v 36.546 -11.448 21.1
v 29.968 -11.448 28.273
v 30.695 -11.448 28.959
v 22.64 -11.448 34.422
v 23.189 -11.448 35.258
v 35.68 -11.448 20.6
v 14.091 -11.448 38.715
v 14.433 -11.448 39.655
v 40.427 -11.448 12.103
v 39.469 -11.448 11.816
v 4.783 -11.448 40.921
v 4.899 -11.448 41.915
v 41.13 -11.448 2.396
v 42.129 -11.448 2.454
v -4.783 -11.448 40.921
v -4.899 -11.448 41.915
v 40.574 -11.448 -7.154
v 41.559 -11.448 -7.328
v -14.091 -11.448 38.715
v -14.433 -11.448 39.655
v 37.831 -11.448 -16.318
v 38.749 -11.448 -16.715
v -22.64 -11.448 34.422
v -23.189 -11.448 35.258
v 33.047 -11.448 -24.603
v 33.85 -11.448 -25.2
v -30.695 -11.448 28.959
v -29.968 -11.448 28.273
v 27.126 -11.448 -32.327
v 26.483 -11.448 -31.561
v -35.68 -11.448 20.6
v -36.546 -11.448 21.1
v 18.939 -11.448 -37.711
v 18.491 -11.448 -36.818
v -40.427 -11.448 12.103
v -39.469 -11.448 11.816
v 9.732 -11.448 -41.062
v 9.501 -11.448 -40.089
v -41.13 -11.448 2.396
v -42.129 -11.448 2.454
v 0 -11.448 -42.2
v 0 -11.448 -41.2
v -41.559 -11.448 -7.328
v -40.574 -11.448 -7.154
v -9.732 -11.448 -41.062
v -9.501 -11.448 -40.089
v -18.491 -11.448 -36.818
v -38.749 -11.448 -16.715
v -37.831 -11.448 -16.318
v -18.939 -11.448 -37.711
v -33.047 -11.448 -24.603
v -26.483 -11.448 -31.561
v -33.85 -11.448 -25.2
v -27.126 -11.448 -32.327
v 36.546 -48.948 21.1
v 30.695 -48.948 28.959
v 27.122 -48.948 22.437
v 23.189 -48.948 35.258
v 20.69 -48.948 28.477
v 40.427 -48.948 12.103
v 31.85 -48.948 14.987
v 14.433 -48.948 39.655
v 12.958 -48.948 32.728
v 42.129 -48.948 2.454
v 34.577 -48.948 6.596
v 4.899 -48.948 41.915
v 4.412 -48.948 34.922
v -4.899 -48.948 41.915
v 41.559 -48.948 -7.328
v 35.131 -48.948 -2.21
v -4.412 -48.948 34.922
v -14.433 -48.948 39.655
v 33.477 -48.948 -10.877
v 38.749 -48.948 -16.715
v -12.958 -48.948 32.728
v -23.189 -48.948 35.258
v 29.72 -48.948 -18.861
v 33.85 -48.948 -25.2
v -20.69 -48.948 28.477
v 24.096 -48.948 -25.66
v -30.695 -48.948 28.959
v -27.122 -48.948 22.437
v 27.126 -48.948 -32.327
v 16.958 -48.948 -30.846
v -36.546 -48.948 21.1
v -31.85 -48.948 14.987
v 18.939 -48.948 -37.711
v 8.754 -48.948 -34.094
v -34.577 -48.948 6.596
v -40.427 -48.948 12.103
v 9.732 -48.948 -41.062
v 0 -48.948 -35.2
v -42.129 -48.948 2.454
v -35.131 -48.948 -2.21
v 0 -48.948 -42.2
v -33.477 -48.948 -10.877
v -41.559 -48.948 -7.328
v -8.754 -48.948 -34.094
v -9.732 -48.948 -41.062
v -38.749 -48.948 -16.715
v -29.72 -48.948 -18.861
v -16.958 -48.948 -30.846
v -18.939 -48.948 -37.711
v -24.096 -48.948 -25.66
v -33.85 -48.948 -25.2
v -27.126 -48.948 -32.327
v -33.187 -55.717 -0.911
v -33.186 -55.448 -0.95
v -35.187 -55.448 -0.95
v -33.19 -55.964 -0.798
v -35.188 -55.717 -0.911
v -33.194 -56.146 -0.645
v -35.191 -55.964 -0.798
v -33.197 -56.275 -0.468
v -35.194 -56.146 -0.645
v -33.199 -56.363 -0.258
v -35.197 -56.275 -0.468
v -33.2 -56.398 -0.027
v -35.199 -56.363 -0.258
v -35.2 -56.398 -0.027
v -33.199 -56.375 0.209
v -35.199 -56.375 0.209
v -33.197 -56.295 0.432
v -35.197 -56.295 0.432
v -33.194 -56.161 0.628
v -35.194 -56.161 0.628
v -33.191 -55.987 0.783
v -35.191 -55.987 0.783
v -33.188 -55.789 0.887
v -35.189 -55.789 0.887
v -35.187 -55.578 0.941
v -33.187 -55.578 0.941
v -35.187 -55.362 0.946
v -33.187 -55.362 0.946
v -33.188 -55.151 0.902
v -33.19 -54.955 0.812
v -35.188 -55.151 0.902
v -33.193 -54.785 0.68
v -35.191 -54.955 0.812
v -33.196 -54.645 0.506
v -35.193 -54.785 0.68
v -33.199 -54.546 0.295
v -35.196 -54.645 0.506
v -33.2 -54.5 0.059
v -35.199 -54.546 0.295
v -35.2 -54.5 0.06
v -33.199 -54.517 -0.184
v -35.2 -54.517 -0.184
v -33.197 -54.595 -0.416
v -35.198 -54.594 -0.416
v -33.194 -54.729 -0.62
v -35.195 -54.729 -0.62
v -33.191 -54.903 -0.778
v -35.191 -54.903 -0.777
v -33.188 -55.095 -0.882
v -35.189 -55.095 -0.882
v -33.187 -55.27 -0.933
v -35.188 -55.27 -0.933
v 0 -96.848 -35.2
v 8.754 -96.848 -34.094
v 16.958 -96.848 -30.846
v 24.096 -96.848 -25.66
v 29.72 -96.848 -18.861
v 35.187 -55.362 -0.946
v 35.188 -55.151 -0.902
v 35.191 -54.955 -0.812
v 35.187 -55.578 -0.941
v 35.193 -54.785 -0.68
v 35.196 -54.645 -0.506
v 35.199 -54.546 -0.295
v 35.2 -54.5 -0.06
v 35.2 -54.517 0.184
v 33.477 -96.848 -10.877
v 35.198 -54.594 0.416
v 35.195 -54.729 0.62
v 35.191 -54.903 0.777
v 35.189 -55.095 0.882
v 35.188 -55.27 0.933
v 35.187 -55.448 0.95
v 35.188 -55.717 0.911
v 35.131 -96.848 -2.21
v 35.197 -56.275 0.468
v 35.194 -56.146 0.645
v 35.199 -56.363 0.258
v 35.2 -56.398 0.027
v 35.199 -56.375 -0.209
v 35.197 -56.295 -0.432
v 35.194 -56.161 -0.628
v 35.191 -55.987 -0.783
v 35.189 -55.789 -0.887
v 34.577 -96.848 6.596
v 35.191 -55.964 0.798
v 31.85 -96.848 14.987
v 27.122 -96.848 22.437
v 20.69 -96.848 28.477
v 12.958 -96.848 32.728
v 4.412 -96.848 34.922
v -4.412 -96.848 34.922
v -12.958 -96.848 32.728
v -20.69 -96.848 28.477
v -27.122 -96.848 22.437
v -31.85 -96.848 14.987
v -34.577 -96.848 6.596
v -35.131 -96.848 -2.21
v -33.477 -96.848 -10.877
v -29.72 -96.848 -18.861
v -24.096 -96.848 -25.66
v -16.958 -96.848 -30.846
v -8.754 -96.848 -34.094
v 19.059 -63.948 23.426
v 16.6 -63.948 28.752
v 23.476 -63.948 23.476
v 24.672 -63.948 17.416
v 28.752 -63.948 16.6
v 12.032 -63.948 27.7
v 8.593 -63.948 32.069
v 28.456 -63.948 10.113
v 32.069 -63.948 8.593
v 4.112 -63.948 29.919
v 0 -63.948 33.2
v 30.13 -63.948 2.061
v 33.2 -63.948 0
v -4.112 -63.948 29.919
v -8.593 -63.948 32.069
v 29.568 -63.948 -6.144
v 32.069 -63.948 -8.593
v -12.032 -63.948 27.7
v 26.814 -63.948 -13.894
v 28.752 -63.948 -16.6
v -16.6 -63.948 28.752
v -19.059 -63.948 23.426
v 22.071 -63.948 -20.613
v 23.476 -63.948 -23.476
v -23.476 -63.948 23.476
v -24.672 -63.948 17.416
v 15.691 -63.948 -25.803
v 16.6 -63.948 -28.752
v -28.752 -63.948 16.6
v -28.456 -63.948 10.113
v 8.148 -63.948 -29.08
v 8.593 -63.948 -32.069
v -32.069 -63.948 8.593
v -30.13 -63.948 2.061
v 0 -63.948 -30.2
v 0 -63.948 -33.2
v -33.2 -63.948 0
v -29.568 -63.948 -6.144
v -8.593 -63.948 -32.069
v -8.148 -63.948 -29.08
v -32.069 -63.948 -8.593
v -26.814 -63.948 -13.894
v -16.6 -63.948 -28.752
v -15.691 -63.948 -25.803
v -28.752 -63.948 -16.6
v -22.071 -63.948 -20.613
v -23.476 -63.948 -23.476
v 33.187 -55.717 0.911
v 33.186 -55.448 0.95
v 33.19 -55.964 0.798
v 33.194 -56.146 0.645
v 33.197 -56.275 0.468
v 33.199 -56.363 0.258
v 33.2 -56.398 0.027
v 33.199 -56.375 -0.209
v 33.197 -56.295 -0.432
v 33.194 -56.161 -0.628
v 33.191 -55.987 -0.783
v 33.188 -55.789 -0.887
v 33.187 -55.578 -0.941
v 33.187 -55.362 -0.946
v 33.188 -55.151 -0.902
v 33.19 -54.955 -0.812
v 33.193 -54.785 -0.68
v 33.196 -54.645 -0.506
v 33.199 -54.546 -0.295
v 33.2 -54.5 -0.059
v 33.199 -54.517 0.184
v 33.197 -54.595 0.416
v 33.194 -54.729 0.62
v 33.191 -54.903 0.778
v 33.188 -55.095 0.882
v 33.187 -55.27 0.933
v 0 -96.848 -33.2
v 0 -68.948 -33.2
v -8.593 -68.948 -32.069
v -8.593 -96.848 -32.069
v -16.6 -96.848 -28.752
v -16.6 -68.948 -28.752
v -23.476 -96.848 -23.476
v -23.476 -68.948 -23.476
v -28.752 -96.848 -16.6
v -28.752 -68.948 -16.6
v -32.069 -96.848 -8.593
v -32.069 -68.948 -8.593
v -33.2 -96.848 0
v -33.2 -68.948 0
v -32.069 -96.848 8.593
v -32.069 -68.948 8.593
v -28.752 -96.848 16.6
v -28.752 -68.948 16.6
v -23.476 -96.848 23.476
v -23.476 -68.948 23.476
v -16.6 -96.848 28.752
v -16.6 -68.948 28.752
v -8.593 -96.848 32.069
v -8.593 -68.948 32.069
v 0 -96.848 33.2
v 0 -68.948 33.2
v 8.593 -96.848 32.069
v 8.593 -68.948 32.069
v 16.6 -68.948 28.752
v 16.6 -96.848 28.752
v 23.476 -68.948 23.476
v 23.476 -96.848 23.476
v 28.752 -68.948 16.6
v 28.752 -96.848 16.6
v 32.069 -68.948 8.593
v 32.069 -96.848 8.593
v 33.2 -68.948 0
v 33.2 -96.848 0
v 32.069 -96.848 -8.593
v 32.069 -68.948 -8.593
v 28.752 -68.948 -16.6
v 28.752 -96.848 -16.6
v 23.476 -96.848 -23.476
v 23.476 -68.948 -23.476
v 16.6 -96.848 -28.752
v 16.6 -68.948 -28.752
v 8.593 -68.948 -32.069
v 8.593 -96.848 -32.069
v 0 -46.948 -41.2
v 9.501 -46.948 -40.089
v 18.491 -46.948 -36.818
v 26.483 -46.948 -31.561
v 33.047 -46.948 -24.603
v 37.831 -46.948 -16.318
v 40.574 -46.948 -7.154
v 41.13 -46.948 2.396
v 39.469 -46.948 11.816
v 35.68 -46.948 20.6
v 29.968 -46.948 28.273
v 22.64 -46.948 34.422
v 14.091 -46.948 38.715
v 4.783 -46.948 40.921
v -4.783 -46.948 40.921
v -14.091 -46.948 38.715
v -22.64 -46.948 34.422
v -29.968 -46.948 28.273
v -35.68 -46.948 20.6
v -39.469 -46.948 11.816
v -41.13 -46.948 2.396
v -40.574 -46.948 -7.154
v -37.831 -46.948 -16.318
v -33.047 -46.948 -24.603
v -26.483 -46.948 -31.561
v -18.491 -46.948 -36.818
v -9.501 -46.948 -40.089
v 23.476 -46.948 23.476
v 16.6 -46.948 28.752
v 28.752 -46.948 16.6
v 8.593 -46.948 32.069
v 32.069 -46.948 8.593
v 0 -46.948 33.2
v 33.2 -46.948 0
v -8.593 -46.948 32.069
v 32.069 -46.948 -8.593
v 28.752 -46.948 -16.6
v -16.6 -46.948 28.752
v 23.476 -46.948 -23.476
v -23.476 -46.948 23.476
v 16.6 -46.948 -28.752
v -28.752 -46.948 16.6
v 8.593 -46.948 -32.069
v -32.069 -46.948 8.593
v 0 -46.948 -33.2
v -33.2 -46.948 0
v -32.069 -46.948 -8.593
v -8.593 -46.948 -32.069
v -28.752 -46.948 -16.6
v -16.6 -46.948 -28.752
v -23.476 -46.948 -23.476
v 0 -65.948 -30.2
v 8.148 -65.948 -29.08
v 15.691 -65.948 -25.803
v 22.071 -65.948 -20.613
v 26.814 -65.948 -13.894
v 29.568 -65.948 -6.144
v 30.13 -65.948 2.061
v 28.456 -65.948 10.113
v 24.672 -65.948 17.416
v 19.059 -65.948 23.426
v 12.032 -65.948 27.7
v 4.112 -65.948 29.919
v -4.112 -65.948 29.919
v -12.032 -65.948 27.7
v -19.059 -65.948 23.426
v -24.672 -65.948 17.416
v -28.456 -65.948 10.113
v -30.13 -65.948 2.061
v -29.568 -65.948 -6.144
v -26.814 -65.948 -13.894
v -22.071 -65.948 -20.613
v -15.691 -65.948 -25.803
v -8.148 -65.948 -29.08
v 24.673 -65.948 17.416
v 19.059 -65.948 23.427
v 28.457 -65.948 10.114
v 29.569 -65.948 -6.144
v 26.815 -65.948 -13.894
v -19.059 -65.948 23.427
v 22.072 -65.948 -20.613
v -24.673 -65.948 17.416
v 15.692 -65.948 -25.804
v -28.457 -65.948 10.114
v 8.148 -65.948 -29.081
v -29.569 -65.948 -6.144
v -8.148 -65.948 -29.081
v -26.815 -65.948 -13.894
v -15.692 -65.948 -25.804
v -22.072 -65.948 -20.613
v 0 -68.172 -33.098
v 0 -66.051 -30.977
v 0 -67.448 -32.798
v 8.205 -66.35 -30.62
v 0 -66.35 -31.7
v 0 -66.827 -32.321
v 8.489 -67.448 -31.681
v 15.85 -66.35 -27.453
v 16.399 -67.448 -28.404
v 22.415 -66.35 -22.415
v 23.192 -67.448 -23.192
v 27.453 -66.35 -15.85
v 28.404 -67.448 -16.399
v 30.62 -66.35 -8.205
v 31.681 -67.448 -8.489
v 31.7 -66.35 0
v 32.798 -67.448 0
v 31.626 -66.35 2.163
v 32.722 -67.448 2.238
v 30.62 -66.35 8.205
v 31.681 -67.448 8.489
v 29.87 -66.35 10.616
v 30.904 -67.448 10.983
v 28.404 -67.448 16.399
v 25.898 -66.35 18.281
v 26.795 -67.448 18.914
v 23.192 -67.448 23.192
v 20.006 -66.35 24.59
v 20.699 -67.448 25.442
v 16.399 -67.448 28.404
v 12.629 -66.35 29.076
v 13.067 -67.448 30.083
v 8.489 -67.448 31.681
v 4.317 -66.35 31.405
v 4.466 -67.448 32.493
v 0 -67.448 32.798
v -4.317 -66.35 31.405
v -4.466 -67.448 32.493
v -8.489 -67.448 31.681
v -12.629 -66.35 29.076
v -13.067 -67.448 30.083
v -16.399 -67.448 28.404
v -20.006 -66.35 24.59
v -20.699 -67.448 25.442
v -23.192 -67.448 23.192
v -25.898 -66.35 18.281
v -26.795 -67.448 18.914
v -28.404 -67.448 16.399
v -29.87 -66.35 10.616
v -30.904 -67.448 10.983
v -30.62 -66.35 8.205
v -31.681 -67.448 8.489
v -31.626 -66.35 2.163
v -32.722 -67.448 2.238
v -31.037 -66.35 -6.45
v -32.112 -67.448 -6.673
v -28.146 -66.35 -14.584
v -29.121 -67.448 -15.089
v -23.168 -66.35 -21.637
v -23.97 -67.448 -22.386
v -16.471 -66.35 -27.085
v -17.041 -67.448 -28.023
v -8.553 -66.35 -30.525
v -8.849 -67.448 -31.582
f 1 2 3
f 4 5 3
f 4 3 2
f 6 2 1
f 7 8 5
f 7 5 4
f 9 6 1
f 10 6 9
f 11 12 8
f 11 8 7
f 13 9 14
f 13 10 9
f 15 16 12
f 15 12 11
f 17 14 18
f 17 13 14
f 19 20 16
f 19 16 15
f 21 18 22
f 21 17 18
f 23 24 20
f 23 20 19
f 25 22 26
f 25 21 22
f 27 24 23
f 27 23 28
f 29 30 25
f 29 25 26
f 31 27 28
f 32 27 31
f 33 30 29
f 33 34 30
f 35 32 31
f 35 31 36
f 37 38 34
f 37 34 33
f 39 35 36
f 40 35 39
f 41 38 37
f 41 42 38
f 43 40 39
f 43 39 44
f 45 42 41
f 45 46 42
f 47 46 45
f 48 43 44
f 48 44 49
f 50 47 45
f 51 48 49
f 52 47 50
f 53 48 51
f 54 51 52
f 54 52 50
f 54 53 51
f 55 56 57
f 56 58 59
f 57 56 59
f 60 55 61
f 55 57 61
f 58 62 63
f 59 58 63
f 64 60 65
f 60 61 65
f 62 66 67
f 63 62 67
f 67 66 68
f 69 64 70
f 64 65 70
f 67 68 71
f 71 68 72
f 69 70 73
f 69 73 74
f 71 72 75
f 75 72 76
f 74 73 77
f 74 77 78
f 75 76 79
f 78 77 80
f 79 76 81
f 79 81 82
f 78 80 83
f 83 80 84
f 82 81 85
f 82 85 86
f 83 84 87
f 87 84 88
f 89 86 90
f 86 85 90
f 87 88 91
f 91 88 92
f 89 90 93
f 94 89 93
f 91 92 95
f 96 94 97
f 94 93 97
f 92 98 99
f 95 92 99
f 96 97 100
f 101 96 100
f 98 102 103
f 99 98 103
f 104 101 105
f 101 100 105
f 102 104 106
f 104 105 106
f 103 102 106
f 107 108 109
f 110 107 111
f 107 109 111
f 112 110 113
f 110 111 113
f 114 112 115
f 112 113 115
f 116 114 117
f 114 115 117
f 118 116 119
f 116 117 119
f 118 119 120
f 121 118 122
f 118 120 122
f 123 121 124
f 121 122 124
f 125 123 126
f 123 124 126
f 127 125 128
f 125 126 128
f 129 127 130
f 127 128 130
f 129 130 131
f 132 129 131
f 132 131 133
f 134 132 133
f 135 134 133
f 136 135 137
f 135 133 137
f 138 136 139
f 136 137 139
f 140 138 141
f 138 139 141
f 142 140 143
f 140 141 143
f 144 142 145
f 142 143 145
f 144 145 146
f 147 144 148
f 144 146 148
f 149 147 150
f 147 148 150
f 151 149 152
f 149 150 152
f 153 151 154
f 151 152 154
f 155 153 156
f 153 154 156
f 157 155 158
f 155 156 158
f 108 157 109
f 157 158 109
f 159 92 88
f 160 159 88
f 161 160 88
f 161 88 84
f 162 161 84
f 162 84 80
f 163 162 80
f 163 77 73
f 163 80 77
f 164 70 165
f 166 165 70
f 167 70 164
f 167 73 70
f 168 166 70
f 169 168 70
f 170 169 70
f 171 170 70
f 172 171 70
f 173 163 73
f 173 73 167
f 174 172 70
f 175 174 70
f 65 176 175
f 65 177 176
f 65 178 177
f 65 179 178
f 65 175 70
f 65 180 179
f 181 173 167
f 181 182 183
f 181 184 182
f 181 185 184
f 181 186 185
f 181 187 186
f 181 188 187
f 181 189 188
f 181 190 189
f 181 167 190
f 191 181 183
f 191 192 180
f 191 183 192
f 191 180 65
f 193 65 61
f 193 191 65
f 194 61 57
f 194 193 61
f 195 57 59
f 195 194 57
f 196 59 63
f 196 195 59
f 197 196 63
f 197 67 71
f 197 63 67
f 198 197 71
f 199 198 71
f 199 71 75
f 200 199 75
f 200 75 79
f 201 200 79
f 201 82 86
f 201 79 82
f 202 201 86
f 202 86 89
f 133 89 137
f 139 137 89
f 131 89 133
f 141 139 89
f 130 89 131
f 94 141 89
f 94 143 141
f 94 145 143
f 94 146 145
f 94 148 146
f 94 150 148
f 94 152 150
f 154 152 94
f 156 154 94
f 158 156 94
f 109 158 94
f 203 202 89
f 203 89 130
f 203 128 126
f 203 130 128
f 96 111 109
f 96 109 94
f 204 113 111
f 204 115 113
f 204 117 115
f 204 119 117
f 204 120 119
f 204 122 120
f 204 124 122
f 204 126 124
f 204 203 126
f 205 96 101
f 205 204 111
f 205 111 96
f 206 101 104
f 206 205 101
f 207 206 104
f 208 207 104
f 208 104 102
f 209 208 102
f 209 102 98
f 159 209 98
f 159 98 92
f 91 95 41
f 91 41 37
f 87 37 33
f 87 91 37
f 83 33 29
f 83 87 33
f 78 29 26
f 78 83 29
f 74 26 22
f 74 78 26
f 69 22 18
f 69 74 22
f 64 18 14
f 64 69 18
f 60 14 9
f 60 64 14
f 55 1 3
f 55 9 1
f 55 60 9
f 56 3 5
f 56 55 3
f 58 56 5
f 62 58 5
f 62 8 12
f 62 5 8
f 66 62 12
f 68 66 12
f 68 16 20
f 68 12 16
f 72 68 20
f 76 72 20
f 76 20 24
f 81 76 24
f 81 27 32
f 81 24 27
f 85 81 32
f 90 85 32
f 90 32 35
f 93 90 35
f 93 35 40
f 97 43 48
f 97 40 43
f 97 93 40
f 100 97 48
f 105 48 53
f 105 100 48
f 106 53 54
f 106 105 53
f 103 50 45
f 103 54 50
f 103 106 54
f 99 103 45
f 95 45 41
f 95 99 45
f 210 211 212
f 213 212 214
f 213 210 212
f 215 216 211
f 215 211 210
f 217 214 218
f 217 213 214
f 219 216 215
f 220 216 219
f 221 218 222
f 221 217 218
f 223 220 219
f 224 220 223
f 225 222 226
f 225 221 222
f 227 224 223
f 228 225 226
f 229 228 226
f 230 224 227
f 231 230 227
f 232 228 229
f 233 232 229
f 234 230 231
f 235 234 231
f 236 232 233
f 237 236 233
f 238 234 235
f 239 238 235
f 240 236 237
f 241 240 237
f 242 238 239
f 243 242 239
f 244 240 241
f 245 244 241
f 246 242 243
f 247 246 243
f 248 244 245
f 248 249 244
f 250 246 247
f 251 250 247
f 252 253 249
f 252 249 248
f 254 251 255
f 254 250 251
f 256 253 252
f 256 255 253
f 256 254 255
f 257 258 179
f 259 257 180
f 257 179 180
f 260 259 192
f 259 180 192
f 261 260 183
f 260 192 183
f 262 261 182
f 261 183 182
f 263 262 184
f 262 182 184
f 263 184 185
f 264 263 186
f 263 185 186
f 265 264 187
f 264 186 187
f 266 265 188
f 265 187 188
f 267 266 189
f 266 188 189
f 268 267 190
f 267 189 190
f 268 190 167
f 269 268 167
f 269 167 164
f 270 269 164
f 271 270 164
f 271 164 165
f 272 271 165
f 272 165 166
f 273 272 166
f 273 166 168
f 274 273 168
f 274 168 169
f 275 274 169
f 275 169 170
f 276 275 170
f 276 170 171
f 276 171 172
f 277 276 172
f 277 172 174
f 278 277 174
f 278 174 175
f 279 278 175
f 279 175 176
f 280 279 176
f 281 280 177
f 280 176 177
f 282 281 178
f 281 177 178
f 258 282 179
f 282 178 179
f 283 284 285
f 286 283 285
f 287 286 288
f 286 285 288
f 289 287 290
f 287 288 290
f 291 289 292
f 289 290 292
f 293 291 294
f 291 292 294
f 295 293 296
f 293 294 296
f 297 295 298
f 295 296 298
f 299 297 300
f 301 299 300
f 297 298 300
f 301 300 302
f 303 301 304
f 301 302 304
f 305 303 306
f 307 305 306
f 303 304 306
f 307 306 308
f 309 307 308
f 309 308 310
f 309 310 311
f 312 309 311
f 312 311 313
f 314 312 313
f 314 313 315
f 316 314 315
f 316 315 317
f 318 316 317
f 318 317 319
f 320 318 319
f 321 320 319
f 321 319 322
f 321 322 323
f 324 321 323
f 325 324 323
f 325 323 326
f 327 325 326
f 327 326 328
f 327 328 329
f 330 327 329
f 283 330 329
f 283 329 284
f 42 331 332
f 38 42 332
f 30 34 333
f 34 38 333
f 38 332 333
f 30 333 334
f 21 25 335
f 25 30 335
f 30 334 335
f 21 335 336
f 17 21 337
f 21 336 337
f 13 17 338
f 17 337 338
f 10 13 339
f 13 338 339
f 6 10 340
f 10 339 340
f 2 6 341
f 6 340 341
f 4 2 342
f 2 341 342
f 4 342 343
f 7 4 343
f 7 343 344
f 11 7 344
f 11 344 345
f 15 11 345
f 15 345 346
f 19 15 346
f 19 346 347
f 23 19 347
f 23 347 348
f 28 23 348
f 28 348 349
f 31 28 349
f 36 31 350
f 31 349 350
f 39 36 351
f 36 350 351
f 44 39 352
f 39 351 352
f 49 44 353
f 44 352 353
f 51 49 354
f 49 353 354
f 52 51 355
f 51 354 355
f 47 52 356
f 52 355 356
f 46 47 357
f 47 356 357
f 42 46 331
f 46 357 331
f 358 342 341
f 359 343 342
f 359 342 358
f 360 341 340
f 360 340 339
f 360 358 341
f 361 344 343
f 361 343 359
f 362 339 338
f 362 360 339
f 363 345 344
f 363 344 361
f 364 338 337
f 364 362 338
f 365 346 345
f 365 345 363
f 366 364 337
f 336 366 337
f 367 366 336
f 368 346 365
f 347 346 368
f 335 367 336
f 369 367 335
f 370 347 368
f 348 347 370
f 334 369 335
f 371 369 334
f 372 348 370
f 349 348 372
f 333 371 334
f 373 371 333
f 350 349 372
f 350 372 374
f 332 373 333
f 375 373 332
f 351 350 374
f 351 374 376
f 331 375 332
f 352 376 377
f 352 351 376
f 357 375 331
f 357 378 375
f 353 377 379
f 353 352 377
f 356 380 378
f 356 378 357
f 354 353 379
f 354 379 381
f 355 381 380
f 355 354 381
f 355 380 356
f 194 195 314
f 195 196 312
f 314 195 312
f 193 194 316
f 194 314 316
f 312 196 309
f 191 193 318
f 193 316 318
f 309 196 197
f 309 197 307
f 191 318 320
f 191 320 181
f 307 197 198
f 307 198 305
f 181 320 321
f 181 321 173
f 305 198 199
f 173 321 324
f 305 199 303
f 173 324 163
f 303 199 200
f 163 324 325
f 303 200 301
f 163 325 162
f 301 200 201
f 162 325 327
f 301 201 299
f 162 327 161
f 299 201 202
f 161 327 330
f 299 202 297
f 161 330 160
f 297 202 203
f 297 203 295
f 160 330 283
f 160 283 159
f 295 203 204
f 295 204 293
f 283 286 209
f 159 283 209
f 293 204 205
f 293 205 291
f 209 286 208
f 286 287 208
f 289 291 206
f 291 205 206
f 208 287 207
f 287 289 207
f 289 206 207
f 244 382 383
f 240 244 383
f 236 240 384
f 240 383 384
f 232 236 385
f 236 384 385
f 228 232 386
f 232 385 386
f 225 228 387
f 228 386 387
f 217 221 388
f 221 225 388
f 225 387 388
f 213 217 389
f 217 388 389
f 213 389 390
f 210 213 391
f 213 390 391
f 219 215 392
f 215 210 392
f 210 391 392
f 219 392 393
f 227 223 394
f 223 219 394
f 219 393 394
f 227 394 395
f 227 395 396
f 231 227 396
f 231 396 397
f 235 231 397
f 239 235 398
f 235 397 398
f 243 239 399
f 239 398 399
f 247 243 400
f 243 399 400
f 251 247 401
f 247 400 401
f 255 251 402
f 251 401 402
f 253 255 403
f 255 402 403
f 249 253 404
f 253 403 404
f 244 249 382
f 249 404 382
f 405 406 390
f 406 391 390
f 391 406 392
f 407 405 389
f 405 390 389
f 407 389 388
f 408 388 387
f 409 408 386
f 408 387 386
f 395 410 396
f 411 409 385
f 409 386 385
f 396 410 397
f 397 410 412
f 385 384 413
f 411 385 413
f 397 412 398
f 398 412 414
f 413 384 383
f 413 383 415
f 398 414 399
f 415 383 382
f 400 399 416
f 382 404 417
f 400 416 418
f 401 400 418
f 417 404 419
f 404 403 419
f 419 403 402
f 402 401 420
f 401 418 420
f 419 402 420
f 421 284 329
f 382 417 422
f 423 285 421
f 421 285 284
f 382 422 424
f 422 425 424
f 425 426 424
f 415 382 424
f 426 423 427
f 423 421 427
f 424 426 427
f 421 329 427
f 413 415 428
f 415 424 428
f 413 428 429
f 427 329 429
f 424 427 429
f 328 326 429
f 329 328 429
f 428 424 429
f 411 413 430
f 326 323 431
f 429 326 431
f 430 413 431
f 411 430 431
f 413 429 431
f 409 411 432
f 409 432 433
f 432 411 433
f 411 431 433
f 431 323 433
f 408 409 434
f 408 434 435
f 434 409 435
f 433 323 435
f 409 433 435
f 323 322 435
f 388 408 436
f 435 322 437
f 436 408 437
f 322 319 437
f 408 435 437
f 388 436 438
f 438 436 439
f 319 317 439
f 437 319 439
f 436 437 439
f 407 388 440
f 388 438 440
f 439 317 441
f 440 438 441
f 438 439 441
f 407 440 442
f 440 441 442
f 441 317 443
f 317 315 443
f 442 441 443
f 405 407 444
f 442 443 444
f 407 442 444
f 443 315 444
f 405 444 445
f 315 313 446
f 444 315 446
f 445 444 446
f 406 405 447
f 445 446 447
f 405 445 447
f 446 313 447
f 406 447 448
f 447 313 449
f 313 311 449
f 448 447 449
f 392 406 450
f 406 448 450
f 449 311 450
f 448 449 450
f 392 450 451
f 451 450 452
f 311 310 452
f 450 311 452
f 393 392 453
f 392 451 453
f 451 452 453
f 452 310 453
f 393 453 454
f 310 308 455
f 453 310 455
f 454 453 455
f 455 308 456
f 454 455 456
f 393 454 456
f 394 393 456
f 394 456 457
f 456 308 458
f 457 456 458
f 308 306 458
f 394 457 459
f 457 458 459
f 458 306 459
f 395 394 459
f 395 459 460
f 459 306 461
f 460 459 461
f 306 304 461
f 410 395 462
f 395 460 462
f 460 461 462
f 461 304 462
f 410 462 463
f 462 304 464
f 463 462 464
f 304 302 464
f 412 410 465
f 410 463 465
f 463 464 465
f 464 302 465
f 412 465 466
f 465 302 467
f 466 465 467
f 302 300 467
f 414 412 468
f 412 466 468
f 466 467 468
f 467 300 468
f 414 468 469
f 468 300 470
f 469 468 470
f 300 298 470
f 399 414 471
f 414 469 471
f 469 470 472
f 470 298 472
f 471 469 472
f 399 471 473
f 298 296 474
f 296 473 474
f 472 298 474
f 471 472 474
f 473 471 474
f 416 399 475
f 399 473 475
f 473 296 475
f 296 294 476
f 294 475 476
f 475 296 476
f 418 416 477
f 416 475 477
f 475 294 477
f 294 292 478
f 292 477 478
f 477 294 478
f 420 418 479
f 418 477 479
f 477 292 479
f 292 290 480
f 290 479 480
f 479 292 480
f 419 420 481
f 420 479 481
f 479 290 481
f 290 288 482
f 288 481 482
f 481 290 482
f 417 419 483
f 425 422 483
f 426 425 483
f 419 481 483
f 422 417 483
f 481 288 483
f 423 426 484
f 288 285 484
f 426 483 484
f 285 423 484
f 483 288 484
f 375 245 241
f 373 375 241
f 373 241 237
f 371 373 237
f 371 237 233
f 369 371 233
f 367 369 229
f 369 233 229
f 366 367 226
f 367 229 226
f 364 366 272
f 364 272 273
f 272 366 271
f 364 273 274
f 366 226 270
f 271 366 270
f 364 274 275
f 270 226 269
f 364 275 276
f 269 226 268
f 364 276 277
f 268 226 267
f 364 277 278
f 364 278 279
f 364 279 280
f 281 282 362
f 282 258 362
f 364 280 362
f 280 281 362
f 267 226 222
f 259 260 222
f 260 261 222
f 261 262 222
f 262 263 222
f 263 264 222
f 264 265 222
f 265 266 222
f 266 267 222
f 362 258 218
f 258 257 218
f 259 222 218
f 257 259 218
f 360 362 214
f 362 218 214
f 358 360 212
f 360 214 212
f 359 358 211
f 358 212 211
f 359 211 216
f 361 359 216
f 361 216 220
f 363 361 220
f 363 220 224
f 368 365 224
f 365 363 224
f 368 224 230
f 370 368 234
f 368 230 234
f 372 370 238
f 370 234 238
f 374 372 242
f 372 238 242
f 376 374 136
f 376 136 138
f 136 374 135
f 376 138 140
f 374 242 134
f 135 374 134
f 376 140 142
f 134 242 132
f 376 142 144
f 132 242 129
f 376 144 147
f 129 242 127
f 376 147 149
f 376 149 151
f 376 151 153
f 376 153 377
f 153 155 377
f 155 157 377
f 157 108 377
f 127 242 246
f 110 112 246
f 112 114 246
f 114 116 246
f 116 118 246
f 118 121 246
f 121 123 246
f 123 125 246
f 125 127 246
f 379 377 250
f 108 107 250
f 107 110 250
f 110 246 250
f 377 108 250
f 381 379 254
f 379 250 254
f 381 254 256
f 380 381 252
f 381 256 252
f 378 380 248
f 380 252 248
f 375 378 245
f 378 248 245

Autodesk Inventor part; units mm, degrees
ref_plane "YZ Plane" through (0, 0, 0) normal (1, 0, 0) x (0, 1, 0)
ref_plane "XZ Plane" through (0, 0, 0) normal (0, 1, 0) x (-1, 0, 0)
ref_plane "XY Plane" through (0, 0, 0) normal (0, 0, 1) x (1, 0, 0)
sketch "Sketch1" plane through (0, 0, 0) normal (1, 0, 0) x (0, 1, 0)
  line L0 (-116.2182, 0) -> (19.3697, 0) projected
  line L1 (-46.9485, -33.2) -> (-46.9485, -41.2)
  line L2 (-11.4485, -41.2) -> (-46.9485, -41.2)
  line L3 (-48.3, -33.2) -> (-60.6, -33.2)
  line L4 (-11.4485, -42.2) -> (-48.9485, -42.2)
  line L5 (-48.9485, -42.2) -> (-48.9485, -35.2)
  line L6 (-48.9485, -35.2) -> (-96.8485, -35.2)
  line L7 (-96.8485, -35.2) -> (-96.8485, -33.2)
  line L8 (-46.9485, -33.2) -> (-48.3, -33.2)
  line L9 (-63.9485, -33.2) -> (-63.9485, -30.2)
  line L10 (-63.9485, -30.2) -> (-65.9485, -30.2)
  line L11 (-65.9485, -30.2) -> (-65.9485, -33.2)
  line L12 (-96.8485, -33.2) -> (-65.9485, -33.2)
  line L13 (-63.9485, -33.2) -> (-60.6, -33.2)
  line L14 (-11.4485, -41.2) -> (-11.4485, -42.2)
  point P0 (0, 0)
  point P1 (-46.9485, -41.7)
  point P2 (-96.8485, -34.2)
  point P3 (-48.9485, -38.7)
  point P4 (-11.4485, -41.7)
  dimension "d43" = 41.2
  dimension "d53" = 33.2
  dimension "d58" = 1
  dimension "d61" = 2
  dimension "d65" = 2
  dimension "d66" = 17
  dimension "d68" = 49.9
  dimension "d69" = 35.5
  dimension "d72" = 2
  dimension "d74" = 42.2
  dimension "d78" = 35.5
  dimension "d79" = 3
revolve "Revolution1" add sketch "Sketch1" angle 360 about axis through (0, -10, 0) along (0, 1, 0)
sketch "Sketch2" plane through (0, 0, 0) normal (1, 0, 0) x (0, 1, 0)
  line L0 (-96.8485, -35.2) -> (-96.8485, 35.2) projected
  line L1 (-114.1482, 0) -> (19.0247, 0) projected
  point P0 (0, 0)
  point P1 (-55.4485, 0)
  dimension "d64" = 41.4
hole "Hole1" at (0, -55.4485, 0) direction (1, 0, 0) diameter 1.9 depth 40
hole "Hole2" at (0, -55.4485, 0) direction (-1, 0, 0) diameter 1.9 depth 40
fillet "Fillet1" [suppressed]
fillet "Fillet3" radius 3 1 edges at (0, -65.9485, 33.2)
equation "\"gap\" = 0.1"
properties part number "BottomTubeDown"
